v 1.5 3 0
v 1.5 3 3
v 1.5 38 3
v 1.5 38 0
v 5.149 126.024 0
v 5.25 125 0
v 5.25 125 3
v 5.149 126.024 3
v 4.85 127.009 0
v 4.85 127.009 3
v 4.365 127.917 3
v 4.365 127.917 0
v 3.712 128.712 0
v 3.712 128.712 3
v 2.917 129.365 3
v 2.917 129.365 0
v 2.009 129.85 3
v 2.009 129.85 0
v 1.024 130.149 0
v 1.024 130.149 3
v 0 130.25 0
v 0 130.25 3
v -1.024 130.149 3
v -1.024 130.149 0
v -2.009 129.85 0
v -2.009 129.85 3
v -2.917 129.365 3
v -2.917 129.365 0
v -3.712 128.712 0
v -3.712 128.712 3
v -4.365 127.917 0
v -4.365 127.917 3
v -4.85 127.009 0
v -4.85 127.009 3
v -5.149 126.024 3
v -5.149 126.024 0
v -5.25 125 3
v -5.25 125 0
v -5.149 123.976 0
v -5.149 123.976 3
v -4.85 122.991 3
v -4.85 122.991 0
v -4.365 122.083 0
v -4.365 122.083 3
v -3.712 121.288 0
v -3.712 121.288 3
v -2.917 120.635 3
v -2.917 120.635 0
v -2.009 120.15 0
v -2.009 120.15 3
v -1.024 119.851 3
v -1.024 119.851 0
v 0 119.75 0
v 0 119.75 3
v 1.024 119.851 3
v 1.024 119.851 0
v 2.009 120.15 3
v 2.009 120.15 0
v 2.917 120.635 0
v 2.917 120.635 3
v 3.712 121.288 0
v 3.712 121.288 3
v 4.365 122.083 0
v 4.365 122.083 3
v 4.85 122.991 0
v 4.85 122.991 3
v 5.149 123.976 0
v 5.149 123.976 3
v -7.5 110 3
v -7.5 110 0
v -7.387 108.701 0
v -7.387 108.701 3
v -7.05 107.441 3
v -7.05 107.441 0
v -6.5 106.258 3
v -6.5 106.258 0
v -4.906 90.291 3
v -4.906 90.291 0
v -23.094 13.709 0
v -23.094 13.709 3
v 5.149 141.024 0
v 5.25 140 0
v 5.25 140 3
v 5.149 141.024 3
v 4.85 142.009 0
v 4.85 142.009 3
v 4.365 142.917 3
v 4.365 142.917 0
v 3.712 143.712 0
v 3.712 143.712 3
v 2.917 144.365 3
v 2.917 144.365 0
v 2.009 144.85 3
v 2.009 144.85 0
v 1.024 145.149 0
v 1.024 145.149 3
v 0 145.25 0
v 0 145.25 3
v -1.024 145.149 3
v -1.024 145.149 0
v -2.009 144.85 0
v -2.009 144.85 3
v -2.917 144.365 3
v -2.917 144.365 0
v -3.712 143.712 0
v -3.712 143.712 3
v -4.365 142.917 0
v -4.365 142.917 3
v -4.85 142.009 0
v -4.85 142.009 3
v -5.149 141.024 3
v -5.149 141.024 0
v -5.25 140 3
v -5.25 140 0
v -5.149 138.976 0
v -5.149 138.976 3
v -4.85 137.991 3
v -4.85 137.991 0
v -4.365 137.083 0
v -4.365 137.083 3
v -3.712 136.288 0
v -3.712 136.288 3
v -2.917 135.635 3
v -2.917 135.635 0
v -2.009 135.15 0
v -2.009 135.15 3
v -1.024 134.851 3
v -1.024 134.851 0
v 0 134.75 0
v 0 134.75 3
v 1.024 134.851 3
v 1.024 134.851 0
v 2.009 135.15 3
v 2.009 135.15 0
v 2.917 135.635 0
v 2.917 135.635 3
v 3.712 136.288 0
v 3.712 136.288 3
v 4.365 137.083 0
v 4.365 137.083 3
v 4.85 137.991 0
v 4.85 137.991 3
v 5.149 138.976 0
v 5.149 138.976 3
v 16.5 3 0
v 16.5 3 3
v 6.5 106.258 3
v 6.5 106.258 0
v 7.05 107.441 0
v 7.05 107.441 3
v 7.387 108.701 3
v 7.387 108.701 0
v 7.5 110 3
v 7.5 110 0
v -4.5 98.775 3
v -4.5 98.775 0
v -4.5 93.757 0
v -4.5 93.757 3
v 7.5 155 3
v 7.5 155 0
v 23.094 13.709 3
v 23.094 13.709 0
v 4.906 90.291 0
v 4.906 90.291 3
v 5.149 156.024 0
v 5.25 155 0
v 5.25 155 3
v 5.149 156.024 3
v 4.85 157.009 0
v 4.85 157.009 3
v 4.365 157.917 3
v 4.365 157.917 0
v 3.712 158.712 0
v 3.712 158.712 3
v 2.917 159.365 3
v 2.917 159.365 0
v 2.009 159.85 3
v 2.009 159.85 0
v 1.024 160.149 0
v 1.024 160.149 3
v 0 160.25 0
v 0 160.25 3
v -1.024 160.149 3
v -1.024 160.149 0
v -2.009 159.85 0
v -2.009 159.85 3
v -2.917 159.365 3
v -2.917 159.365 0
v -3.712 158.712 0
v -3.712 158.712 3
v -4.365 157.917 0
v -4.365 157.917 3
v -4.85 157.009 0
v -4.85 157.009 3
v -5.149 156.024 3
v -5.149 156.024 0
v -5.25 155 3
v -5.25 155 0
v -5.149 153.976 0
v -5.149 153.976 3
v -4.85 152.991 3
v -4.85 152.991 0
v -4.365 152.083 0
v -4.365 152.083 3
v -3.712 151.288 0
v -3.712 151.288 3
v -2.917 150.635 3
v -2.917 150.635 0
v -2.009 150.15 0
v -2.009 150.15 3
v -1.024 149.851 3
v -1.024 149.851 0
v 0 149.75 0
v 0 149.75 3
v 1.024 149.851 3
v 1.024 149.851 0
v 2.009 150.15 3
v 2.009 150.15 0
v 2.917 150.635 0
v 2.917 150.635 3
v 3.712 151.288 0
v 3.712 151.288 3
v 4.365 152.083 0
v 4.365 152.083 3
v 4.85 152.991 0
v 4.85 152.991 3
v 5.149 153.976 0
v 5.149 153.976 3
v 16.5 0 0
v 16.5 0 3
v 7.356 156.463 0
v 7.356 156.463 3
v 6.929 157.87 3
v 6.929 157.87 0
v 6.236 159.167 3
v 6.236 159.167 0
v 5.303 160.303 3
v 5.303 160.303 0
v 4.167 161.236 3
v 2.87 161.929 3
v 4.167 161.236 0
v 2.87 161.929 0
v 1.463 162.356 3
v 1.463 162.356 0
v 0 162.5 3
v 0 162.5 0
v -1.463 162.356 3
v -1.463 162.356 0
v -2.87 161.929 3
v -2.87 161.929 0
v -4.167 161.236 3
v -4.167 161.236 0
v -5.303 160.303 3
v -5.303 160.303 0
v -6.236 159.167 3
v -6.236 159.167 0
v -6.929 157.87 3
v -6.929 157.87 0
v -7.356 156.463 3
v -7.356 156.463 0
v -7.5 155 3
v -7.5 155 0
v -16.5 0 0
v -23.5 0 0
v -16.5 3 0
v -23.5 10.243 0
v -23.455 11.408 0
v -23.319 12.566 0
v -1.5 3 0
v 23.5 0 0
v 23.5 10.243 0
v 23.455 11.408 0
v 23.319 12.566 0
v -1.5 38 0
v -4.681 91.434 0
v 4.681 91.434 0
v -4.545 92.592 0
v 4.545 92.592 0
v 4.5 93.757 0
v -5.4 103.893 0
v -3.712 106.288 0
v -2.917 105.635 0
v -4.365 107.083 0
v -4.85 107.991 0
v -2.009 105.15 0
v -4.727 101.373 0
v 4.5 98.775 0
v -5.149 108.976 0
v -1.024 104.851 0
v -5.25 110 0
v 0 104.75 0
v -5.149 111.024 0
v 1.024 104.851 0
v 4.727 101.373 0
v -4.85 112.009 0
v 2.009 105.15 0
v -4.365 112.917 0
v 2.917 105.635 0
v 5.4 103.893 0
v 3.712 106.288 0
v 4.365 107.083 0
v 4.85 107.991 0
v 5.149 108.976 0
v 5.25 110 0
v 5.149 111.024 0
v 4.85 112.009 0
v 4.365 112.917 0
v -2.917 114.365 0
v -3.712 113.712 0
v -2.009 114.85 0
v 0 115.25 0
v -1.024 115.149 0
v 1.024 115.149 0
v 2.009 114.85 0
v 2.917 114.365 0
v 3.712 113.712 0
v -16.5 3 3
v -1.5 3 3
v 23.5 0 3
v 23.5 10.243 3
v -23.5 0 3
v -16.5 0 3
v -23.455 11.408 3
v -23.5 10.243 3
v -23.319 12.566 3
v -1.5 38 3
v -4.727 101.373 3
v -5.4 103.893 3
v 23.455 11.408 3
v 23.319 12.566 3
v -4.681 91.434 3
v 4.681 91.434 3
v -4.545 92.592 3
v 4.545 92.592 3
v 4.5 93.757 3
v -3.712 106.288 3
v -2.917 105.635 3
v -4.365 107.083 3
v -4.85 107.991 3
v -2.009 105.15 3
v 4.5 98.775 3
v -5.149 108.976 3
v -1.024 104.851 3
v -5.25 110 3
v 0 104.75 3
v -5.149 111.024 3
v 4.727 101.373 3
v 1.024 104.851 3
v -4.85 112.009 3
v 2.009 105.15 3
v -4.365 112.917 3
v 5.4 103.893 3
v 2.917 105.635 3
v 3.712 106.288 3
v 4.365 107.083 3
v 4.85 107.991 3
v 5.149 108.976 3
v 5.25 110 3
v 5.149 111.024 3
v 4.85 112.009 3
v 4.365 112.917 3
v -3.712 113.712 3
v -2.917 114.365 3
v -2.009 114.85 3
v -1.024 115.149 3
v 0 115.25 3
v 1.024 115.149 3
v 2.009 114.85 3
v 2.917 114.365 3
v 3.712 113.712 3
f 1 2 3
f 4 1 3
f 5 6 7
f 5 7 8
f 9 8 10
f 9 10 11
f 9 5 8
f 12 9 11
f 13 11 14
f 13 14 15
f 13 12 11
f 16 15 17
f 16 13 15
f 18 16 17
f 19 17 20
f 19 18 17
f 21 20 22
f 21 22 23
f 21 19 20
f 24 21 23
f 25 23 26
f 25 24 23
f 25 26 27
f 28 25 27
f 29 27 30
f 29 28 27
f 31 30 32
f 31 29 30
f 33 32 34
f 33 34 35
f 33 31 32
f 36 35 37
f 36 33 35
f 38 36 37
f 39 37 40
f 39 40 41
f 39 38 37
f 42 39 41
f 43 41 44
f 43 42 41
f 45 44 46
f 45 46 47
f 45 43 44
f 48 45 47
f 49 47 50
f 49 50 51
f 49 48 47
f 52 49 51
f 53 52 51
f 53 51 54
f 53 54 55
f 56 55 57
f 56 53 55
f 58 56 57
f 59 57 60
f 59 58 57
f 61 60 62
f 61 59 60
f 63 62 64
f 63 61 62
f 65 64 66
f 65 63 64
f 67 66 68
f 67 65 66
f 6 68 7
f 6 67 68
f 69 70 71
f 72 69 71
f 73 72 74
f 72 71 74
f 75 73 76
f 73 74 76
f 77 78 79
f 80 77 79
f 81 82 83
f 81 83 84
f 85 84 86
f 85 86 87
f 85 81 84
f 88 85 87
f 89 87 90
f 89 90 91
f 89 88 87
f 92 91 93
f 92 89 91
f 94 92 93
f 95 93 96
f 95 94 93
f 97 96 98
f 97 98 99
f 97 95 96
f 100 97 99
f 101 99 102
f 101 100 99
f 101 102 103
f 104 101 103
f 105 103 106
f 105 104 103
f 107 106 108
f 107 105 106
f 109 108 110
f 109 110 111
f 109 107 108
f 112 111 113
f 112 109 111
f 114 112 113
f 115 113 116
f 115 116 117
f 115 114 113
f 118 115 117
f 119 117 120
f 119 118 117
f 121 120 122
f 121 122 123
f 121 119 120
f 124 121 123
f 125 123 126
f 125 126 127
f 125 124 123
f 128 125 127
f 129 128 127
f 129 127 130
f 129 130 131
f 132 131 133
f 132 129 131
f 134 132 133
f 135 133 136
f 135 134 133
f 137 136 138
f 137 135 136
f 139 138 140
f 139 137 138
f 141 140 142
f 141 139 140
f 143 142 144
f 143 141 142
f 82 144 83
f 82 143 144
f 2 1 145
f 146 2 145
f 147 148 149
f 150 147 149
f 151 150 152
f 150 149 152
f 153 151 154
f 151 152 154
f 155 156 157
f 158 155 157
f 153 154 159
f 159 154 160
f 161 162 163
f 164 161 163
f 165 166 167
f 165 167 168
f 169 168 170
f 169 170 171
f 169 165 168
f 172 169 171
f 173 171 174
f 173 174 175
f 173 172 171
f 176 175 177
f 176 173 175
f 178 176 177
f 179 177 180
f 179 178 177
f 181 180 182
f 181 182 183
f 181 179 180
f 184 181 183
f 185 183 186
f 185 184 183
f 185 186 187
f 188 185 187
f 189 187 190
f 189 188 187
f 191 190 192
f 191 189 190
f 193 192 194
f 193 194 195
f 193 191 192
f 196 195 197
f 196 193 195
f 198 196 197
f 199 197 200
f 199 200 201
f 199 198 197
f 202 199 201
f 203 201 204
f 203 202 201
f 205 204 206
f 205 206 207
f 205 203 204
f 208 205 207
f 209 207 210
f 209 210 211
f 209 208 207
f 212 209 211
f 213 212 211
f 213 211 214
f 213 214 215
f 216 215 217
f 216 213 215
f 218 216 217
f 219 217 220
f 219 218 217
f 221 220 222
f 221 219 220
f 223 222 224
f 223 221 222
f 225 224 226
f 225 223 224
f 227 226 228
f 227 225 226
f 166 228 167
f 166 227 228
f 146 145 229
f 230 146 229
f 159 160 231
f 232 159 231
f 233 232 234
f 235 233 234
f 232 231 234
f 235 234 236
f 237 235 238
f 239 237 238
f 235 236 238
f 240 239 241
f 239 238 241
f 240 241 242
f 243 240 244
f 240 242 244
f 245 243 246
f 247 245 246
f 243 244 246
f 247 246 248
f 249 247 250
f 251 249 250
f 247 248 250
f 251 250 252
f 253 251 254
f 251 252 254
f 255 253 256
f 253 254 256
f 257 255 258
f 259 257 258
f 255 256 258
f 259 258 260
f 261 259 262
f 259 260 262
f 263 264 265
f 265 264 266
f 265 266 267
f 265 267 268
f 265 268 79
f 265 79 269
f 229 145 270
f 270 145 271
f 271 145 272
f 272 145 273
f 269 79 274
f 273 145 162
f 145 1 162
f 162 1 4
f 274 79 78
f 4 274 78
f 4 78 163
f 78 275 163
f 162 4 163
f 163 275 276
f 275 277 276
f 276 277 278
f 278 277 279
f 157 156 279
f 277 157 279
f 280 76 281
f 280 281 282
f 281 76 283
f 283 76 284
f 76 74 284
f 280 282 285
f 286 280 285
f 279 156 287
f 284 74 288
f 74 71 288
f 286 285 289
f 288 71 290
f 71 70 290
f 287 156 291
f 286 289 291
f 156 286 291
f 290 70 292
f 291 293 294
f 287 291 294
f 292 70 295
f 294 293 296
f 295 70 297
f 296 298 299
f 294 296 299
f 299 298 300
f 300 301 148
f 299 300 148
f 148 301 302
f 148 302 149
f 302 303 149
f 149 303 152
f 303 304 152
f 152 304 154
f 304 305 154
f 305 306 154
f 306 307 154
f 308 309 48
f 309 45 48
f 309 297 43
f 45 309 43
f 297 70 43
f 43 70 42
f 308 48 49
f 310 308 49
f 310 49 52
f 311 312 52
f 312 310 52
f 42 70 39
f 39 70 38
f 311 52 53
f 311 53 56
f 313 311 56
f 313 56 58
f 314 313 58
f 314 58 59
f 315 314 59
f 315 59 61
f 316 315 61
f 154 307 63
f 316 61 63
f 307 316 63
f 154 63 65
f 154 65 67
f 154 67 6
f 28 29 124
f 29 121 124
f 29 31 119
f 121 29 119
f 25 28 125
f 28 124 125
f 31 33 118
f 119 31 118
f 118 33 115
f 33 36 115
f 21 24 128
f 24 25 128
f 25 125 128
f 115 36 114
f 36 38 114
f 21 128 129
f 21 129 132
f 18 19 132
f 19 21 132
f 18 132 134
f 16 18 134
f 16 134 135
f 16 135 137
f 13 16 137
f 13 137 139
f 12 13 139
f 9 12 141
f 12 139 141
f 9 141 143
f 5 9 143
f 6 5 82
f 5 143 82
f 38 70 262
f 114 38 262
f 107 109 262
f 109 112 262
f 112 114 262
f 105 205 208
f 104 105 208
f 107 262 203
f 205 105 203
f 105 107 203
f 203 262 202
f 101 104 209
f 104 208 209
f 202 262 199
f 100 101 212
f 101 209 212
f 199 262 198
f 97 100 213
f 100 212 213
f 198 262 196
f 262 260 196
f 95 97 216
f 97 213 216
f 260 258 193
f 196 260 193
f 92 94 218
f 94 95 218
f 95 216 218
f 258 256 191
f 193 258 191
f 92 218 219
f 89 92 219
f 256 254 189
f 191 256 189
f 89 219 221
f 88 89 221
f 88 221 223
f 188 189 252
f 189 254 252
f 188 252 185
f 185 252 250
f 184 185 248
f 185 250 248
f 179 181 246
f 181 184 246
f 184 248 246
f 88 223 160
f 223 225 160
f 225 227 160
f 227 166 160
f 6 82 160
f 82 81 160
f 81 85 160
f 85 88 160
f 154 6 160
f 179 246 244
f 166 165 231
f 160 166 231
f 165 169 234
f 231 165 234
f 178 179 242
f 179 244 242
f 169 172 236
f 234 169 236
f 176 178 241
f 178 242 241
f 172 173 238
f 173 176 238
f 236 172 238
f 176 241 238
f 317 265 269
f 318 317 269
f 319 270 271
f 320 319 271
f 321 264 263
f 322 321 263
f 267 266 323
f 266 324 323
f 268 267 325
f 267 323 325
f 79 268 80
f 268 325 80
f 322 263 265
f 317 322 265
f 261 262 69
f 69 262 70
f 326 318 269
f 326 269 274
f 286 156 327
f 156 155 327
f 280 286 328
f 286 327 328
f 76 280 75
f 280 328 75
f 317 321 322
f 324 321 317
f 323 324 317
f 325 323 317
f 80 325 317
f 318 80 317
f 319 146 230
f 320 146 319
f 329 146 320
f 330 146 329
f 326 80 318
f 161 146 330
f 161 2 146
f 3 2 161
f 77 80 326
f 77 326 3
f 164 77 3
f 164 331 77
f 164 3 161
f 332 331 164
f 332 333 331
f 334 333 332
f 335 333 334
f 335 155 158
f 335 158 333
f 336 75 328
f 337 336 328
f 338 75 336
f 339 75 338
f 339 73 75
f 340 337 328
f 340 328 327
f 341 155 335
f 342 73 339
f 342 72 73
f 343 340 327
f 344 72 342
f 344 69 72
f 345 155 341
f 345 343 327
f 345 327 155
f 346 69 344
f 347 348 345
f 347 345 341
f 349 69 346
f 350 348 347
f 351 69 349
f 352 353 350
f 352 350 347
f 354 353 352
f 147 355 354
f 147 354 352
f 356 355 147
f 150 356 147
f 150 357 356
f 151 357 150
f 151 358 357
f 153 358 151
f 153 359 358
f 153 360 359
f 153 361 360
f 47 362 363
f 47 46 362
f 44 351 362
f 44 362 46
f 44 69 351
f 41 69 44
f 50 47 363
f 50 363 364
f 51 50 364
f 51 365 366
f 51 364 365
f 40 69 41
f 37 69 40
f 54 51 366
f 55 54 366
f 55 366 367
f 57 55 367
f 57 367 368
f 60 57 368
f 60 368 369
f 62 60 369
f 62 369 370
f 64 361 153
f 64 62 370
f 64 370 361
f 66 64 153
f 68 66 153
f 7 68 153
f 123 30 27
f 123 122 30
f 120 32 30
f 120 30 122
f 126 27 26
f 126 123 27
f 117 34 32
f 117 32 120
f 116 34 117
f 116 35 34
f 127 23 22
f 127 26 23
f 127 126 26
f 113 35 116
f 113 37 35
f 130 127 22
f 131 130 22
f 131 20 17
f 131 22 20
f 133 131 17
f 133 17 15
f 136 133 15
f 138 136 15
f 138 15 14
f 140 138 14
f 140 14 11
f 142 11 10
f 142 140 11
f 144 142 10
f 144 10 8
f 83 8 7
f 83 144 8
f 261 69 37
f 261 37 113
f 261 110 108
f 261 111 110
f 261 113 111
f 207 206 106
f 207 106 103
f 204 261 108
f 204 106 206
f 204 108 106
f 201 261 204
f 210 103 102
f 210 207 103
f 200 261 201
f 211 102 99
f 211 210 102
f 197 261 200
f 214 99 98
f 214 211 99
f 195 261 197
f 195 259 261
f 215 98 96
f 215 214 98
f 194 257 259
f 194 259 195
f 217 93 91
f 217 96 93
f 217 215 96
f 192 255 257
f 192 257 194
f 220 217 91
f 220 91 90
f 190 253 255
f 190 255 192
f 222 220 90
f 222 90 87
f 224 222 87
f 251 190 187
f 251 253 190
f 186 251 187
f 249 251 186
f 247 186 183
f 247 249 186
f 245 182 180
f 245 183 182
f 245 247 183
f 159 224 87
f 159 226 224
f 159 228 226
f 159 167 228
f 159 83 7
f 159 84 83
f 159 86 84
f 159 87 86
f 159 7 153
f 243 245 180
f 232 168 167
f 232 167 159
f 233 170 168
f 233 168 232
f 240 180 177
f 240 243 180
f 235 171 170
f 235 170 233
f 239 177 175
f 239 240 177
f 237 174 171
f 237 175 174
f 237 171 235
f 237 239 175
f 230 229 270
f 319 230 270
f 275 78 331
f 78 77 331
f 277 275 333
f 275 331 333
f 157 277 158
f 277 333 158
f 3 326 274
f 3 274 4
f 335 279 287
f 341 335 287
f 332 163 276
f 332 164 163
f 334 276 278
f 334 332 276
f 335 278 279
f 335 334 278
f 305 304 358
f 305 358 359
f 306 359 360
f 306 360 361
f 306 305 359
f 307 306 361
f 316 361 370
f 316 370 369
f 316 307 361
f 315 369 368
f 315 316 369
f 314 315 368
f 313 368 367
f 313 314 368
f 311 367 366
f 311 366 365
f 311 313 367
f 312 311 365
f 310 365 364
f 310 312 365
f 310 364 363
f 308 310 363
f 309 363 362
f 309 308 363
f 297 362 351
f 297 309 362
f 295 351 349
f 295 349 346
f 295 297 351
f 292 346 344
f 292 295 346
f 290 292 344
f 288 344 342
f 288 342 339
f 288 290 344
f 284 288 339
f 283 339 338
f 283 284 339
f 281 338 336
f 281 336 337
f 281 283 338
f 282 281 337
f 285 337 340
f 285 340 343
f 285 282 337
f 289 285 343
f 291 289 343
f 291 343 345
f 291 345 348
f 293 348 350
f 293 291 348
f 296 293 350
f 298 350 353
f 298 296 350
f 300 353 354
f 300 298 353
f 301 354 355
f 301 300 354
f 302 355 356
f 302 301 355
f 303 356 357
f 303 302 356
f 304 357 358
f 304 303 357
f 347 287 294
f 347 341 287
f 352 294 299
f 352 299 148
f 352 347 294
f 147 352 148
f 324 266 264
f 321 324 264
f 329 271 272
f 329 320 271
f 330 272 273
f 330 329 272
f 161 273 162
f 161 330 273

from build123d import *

# Parameters (mm, degrees)
ESBO_O1_R                = 5.25
RESSALTO_EXTRUS_O1_DEPTH = 3
FILETE1_R                = 15
ESBO_O2_W                = 3
ESBO_O2_H                = 35
CORTE_EXTRUS_O1_DEPTH    = 3


with BuildPart() as part:
    # Esboço1 → Ressalto-extrusão1 (new body)
    with BuildSketch(Plane.XY):
        with BuildLine():
            Line((-23.5, 0), (-16.5, 0))
            Line((-16.5, 0), (-16.5, 3))
            Line((-16.5, 3), (16.5, 3))
            Line((16.5, 3), (16.5, 0))
            Line((16.5, 0), (23.5, 0))
            Line((23.5, 0), (23.5, 12))
            Line((23.5, 12), (4.5, 92))
            Line((4.5, 92), (4.5, 104))
            ThreePointArc((4.5, 104), (6.708203932, 106.645898034), (7.5, 110))
            Line((7.5, 110), (7.5, 155))
            ThreePointArc((7.5, 155), (0, 162.5), (-7.5, 155))
            Line((-7.5, 155), (-7.5, 110))
            ThreePointArc((-7.5, 110), (-6.708203932, 106.645898034), (-4.5, 104))
            Line((-4.5, 104), (-4.5, 92))
            Line((-4.5, 92), (-23.5, 12))
            Line((-23.5, 12), (-23.5, 0))
        make_face()
        with Locations((0, 110)):
            Circle(ESBO_O1_R, mode=Mode.SUBTRACT)
        with Locations((0, 125)):
            Circle(ESBO_O1_R, mode=Mode.SUBTRACT)
        with Locations((0, 140)):
            Circle(ESBO_O1_R, mode=Mode.SUBTRACT)
        with Locations((0, 155)):
            Circle(ESBO_O1_R, mode=Mode.SUBTRACT)
    extrude(amount=RESSALTO_EXTRUS_O1_DEPTH)

    # Filete1
    filete1_edges = [part.edges().sort_by_distance(p)[0] for p in [
        (-23.5, 12, 1.5),
        (-4.5, 92, 1.5),
        (-4.5, 104, 1.5),
        (4.5, 104, 1.5),
        (4.5, 92, 1.5),
        (23.5, 12, 1.5),
    ]]
    fillet(filete1_edges, radius=FILETE1_R)

    # Esboço2 → Corte-extrusão1 (cut)
    with BuildSketch(Plane.XY.offset(3)):
        with Locations((0, 20.5)):
            Rectangle(ESBO_O2_W, ESBO_O2_H)
    extrude(amount=-CORTE_EXTRUS_O1_DEPTH, mode=Mode.SUBTRACT)


solid = part.part
